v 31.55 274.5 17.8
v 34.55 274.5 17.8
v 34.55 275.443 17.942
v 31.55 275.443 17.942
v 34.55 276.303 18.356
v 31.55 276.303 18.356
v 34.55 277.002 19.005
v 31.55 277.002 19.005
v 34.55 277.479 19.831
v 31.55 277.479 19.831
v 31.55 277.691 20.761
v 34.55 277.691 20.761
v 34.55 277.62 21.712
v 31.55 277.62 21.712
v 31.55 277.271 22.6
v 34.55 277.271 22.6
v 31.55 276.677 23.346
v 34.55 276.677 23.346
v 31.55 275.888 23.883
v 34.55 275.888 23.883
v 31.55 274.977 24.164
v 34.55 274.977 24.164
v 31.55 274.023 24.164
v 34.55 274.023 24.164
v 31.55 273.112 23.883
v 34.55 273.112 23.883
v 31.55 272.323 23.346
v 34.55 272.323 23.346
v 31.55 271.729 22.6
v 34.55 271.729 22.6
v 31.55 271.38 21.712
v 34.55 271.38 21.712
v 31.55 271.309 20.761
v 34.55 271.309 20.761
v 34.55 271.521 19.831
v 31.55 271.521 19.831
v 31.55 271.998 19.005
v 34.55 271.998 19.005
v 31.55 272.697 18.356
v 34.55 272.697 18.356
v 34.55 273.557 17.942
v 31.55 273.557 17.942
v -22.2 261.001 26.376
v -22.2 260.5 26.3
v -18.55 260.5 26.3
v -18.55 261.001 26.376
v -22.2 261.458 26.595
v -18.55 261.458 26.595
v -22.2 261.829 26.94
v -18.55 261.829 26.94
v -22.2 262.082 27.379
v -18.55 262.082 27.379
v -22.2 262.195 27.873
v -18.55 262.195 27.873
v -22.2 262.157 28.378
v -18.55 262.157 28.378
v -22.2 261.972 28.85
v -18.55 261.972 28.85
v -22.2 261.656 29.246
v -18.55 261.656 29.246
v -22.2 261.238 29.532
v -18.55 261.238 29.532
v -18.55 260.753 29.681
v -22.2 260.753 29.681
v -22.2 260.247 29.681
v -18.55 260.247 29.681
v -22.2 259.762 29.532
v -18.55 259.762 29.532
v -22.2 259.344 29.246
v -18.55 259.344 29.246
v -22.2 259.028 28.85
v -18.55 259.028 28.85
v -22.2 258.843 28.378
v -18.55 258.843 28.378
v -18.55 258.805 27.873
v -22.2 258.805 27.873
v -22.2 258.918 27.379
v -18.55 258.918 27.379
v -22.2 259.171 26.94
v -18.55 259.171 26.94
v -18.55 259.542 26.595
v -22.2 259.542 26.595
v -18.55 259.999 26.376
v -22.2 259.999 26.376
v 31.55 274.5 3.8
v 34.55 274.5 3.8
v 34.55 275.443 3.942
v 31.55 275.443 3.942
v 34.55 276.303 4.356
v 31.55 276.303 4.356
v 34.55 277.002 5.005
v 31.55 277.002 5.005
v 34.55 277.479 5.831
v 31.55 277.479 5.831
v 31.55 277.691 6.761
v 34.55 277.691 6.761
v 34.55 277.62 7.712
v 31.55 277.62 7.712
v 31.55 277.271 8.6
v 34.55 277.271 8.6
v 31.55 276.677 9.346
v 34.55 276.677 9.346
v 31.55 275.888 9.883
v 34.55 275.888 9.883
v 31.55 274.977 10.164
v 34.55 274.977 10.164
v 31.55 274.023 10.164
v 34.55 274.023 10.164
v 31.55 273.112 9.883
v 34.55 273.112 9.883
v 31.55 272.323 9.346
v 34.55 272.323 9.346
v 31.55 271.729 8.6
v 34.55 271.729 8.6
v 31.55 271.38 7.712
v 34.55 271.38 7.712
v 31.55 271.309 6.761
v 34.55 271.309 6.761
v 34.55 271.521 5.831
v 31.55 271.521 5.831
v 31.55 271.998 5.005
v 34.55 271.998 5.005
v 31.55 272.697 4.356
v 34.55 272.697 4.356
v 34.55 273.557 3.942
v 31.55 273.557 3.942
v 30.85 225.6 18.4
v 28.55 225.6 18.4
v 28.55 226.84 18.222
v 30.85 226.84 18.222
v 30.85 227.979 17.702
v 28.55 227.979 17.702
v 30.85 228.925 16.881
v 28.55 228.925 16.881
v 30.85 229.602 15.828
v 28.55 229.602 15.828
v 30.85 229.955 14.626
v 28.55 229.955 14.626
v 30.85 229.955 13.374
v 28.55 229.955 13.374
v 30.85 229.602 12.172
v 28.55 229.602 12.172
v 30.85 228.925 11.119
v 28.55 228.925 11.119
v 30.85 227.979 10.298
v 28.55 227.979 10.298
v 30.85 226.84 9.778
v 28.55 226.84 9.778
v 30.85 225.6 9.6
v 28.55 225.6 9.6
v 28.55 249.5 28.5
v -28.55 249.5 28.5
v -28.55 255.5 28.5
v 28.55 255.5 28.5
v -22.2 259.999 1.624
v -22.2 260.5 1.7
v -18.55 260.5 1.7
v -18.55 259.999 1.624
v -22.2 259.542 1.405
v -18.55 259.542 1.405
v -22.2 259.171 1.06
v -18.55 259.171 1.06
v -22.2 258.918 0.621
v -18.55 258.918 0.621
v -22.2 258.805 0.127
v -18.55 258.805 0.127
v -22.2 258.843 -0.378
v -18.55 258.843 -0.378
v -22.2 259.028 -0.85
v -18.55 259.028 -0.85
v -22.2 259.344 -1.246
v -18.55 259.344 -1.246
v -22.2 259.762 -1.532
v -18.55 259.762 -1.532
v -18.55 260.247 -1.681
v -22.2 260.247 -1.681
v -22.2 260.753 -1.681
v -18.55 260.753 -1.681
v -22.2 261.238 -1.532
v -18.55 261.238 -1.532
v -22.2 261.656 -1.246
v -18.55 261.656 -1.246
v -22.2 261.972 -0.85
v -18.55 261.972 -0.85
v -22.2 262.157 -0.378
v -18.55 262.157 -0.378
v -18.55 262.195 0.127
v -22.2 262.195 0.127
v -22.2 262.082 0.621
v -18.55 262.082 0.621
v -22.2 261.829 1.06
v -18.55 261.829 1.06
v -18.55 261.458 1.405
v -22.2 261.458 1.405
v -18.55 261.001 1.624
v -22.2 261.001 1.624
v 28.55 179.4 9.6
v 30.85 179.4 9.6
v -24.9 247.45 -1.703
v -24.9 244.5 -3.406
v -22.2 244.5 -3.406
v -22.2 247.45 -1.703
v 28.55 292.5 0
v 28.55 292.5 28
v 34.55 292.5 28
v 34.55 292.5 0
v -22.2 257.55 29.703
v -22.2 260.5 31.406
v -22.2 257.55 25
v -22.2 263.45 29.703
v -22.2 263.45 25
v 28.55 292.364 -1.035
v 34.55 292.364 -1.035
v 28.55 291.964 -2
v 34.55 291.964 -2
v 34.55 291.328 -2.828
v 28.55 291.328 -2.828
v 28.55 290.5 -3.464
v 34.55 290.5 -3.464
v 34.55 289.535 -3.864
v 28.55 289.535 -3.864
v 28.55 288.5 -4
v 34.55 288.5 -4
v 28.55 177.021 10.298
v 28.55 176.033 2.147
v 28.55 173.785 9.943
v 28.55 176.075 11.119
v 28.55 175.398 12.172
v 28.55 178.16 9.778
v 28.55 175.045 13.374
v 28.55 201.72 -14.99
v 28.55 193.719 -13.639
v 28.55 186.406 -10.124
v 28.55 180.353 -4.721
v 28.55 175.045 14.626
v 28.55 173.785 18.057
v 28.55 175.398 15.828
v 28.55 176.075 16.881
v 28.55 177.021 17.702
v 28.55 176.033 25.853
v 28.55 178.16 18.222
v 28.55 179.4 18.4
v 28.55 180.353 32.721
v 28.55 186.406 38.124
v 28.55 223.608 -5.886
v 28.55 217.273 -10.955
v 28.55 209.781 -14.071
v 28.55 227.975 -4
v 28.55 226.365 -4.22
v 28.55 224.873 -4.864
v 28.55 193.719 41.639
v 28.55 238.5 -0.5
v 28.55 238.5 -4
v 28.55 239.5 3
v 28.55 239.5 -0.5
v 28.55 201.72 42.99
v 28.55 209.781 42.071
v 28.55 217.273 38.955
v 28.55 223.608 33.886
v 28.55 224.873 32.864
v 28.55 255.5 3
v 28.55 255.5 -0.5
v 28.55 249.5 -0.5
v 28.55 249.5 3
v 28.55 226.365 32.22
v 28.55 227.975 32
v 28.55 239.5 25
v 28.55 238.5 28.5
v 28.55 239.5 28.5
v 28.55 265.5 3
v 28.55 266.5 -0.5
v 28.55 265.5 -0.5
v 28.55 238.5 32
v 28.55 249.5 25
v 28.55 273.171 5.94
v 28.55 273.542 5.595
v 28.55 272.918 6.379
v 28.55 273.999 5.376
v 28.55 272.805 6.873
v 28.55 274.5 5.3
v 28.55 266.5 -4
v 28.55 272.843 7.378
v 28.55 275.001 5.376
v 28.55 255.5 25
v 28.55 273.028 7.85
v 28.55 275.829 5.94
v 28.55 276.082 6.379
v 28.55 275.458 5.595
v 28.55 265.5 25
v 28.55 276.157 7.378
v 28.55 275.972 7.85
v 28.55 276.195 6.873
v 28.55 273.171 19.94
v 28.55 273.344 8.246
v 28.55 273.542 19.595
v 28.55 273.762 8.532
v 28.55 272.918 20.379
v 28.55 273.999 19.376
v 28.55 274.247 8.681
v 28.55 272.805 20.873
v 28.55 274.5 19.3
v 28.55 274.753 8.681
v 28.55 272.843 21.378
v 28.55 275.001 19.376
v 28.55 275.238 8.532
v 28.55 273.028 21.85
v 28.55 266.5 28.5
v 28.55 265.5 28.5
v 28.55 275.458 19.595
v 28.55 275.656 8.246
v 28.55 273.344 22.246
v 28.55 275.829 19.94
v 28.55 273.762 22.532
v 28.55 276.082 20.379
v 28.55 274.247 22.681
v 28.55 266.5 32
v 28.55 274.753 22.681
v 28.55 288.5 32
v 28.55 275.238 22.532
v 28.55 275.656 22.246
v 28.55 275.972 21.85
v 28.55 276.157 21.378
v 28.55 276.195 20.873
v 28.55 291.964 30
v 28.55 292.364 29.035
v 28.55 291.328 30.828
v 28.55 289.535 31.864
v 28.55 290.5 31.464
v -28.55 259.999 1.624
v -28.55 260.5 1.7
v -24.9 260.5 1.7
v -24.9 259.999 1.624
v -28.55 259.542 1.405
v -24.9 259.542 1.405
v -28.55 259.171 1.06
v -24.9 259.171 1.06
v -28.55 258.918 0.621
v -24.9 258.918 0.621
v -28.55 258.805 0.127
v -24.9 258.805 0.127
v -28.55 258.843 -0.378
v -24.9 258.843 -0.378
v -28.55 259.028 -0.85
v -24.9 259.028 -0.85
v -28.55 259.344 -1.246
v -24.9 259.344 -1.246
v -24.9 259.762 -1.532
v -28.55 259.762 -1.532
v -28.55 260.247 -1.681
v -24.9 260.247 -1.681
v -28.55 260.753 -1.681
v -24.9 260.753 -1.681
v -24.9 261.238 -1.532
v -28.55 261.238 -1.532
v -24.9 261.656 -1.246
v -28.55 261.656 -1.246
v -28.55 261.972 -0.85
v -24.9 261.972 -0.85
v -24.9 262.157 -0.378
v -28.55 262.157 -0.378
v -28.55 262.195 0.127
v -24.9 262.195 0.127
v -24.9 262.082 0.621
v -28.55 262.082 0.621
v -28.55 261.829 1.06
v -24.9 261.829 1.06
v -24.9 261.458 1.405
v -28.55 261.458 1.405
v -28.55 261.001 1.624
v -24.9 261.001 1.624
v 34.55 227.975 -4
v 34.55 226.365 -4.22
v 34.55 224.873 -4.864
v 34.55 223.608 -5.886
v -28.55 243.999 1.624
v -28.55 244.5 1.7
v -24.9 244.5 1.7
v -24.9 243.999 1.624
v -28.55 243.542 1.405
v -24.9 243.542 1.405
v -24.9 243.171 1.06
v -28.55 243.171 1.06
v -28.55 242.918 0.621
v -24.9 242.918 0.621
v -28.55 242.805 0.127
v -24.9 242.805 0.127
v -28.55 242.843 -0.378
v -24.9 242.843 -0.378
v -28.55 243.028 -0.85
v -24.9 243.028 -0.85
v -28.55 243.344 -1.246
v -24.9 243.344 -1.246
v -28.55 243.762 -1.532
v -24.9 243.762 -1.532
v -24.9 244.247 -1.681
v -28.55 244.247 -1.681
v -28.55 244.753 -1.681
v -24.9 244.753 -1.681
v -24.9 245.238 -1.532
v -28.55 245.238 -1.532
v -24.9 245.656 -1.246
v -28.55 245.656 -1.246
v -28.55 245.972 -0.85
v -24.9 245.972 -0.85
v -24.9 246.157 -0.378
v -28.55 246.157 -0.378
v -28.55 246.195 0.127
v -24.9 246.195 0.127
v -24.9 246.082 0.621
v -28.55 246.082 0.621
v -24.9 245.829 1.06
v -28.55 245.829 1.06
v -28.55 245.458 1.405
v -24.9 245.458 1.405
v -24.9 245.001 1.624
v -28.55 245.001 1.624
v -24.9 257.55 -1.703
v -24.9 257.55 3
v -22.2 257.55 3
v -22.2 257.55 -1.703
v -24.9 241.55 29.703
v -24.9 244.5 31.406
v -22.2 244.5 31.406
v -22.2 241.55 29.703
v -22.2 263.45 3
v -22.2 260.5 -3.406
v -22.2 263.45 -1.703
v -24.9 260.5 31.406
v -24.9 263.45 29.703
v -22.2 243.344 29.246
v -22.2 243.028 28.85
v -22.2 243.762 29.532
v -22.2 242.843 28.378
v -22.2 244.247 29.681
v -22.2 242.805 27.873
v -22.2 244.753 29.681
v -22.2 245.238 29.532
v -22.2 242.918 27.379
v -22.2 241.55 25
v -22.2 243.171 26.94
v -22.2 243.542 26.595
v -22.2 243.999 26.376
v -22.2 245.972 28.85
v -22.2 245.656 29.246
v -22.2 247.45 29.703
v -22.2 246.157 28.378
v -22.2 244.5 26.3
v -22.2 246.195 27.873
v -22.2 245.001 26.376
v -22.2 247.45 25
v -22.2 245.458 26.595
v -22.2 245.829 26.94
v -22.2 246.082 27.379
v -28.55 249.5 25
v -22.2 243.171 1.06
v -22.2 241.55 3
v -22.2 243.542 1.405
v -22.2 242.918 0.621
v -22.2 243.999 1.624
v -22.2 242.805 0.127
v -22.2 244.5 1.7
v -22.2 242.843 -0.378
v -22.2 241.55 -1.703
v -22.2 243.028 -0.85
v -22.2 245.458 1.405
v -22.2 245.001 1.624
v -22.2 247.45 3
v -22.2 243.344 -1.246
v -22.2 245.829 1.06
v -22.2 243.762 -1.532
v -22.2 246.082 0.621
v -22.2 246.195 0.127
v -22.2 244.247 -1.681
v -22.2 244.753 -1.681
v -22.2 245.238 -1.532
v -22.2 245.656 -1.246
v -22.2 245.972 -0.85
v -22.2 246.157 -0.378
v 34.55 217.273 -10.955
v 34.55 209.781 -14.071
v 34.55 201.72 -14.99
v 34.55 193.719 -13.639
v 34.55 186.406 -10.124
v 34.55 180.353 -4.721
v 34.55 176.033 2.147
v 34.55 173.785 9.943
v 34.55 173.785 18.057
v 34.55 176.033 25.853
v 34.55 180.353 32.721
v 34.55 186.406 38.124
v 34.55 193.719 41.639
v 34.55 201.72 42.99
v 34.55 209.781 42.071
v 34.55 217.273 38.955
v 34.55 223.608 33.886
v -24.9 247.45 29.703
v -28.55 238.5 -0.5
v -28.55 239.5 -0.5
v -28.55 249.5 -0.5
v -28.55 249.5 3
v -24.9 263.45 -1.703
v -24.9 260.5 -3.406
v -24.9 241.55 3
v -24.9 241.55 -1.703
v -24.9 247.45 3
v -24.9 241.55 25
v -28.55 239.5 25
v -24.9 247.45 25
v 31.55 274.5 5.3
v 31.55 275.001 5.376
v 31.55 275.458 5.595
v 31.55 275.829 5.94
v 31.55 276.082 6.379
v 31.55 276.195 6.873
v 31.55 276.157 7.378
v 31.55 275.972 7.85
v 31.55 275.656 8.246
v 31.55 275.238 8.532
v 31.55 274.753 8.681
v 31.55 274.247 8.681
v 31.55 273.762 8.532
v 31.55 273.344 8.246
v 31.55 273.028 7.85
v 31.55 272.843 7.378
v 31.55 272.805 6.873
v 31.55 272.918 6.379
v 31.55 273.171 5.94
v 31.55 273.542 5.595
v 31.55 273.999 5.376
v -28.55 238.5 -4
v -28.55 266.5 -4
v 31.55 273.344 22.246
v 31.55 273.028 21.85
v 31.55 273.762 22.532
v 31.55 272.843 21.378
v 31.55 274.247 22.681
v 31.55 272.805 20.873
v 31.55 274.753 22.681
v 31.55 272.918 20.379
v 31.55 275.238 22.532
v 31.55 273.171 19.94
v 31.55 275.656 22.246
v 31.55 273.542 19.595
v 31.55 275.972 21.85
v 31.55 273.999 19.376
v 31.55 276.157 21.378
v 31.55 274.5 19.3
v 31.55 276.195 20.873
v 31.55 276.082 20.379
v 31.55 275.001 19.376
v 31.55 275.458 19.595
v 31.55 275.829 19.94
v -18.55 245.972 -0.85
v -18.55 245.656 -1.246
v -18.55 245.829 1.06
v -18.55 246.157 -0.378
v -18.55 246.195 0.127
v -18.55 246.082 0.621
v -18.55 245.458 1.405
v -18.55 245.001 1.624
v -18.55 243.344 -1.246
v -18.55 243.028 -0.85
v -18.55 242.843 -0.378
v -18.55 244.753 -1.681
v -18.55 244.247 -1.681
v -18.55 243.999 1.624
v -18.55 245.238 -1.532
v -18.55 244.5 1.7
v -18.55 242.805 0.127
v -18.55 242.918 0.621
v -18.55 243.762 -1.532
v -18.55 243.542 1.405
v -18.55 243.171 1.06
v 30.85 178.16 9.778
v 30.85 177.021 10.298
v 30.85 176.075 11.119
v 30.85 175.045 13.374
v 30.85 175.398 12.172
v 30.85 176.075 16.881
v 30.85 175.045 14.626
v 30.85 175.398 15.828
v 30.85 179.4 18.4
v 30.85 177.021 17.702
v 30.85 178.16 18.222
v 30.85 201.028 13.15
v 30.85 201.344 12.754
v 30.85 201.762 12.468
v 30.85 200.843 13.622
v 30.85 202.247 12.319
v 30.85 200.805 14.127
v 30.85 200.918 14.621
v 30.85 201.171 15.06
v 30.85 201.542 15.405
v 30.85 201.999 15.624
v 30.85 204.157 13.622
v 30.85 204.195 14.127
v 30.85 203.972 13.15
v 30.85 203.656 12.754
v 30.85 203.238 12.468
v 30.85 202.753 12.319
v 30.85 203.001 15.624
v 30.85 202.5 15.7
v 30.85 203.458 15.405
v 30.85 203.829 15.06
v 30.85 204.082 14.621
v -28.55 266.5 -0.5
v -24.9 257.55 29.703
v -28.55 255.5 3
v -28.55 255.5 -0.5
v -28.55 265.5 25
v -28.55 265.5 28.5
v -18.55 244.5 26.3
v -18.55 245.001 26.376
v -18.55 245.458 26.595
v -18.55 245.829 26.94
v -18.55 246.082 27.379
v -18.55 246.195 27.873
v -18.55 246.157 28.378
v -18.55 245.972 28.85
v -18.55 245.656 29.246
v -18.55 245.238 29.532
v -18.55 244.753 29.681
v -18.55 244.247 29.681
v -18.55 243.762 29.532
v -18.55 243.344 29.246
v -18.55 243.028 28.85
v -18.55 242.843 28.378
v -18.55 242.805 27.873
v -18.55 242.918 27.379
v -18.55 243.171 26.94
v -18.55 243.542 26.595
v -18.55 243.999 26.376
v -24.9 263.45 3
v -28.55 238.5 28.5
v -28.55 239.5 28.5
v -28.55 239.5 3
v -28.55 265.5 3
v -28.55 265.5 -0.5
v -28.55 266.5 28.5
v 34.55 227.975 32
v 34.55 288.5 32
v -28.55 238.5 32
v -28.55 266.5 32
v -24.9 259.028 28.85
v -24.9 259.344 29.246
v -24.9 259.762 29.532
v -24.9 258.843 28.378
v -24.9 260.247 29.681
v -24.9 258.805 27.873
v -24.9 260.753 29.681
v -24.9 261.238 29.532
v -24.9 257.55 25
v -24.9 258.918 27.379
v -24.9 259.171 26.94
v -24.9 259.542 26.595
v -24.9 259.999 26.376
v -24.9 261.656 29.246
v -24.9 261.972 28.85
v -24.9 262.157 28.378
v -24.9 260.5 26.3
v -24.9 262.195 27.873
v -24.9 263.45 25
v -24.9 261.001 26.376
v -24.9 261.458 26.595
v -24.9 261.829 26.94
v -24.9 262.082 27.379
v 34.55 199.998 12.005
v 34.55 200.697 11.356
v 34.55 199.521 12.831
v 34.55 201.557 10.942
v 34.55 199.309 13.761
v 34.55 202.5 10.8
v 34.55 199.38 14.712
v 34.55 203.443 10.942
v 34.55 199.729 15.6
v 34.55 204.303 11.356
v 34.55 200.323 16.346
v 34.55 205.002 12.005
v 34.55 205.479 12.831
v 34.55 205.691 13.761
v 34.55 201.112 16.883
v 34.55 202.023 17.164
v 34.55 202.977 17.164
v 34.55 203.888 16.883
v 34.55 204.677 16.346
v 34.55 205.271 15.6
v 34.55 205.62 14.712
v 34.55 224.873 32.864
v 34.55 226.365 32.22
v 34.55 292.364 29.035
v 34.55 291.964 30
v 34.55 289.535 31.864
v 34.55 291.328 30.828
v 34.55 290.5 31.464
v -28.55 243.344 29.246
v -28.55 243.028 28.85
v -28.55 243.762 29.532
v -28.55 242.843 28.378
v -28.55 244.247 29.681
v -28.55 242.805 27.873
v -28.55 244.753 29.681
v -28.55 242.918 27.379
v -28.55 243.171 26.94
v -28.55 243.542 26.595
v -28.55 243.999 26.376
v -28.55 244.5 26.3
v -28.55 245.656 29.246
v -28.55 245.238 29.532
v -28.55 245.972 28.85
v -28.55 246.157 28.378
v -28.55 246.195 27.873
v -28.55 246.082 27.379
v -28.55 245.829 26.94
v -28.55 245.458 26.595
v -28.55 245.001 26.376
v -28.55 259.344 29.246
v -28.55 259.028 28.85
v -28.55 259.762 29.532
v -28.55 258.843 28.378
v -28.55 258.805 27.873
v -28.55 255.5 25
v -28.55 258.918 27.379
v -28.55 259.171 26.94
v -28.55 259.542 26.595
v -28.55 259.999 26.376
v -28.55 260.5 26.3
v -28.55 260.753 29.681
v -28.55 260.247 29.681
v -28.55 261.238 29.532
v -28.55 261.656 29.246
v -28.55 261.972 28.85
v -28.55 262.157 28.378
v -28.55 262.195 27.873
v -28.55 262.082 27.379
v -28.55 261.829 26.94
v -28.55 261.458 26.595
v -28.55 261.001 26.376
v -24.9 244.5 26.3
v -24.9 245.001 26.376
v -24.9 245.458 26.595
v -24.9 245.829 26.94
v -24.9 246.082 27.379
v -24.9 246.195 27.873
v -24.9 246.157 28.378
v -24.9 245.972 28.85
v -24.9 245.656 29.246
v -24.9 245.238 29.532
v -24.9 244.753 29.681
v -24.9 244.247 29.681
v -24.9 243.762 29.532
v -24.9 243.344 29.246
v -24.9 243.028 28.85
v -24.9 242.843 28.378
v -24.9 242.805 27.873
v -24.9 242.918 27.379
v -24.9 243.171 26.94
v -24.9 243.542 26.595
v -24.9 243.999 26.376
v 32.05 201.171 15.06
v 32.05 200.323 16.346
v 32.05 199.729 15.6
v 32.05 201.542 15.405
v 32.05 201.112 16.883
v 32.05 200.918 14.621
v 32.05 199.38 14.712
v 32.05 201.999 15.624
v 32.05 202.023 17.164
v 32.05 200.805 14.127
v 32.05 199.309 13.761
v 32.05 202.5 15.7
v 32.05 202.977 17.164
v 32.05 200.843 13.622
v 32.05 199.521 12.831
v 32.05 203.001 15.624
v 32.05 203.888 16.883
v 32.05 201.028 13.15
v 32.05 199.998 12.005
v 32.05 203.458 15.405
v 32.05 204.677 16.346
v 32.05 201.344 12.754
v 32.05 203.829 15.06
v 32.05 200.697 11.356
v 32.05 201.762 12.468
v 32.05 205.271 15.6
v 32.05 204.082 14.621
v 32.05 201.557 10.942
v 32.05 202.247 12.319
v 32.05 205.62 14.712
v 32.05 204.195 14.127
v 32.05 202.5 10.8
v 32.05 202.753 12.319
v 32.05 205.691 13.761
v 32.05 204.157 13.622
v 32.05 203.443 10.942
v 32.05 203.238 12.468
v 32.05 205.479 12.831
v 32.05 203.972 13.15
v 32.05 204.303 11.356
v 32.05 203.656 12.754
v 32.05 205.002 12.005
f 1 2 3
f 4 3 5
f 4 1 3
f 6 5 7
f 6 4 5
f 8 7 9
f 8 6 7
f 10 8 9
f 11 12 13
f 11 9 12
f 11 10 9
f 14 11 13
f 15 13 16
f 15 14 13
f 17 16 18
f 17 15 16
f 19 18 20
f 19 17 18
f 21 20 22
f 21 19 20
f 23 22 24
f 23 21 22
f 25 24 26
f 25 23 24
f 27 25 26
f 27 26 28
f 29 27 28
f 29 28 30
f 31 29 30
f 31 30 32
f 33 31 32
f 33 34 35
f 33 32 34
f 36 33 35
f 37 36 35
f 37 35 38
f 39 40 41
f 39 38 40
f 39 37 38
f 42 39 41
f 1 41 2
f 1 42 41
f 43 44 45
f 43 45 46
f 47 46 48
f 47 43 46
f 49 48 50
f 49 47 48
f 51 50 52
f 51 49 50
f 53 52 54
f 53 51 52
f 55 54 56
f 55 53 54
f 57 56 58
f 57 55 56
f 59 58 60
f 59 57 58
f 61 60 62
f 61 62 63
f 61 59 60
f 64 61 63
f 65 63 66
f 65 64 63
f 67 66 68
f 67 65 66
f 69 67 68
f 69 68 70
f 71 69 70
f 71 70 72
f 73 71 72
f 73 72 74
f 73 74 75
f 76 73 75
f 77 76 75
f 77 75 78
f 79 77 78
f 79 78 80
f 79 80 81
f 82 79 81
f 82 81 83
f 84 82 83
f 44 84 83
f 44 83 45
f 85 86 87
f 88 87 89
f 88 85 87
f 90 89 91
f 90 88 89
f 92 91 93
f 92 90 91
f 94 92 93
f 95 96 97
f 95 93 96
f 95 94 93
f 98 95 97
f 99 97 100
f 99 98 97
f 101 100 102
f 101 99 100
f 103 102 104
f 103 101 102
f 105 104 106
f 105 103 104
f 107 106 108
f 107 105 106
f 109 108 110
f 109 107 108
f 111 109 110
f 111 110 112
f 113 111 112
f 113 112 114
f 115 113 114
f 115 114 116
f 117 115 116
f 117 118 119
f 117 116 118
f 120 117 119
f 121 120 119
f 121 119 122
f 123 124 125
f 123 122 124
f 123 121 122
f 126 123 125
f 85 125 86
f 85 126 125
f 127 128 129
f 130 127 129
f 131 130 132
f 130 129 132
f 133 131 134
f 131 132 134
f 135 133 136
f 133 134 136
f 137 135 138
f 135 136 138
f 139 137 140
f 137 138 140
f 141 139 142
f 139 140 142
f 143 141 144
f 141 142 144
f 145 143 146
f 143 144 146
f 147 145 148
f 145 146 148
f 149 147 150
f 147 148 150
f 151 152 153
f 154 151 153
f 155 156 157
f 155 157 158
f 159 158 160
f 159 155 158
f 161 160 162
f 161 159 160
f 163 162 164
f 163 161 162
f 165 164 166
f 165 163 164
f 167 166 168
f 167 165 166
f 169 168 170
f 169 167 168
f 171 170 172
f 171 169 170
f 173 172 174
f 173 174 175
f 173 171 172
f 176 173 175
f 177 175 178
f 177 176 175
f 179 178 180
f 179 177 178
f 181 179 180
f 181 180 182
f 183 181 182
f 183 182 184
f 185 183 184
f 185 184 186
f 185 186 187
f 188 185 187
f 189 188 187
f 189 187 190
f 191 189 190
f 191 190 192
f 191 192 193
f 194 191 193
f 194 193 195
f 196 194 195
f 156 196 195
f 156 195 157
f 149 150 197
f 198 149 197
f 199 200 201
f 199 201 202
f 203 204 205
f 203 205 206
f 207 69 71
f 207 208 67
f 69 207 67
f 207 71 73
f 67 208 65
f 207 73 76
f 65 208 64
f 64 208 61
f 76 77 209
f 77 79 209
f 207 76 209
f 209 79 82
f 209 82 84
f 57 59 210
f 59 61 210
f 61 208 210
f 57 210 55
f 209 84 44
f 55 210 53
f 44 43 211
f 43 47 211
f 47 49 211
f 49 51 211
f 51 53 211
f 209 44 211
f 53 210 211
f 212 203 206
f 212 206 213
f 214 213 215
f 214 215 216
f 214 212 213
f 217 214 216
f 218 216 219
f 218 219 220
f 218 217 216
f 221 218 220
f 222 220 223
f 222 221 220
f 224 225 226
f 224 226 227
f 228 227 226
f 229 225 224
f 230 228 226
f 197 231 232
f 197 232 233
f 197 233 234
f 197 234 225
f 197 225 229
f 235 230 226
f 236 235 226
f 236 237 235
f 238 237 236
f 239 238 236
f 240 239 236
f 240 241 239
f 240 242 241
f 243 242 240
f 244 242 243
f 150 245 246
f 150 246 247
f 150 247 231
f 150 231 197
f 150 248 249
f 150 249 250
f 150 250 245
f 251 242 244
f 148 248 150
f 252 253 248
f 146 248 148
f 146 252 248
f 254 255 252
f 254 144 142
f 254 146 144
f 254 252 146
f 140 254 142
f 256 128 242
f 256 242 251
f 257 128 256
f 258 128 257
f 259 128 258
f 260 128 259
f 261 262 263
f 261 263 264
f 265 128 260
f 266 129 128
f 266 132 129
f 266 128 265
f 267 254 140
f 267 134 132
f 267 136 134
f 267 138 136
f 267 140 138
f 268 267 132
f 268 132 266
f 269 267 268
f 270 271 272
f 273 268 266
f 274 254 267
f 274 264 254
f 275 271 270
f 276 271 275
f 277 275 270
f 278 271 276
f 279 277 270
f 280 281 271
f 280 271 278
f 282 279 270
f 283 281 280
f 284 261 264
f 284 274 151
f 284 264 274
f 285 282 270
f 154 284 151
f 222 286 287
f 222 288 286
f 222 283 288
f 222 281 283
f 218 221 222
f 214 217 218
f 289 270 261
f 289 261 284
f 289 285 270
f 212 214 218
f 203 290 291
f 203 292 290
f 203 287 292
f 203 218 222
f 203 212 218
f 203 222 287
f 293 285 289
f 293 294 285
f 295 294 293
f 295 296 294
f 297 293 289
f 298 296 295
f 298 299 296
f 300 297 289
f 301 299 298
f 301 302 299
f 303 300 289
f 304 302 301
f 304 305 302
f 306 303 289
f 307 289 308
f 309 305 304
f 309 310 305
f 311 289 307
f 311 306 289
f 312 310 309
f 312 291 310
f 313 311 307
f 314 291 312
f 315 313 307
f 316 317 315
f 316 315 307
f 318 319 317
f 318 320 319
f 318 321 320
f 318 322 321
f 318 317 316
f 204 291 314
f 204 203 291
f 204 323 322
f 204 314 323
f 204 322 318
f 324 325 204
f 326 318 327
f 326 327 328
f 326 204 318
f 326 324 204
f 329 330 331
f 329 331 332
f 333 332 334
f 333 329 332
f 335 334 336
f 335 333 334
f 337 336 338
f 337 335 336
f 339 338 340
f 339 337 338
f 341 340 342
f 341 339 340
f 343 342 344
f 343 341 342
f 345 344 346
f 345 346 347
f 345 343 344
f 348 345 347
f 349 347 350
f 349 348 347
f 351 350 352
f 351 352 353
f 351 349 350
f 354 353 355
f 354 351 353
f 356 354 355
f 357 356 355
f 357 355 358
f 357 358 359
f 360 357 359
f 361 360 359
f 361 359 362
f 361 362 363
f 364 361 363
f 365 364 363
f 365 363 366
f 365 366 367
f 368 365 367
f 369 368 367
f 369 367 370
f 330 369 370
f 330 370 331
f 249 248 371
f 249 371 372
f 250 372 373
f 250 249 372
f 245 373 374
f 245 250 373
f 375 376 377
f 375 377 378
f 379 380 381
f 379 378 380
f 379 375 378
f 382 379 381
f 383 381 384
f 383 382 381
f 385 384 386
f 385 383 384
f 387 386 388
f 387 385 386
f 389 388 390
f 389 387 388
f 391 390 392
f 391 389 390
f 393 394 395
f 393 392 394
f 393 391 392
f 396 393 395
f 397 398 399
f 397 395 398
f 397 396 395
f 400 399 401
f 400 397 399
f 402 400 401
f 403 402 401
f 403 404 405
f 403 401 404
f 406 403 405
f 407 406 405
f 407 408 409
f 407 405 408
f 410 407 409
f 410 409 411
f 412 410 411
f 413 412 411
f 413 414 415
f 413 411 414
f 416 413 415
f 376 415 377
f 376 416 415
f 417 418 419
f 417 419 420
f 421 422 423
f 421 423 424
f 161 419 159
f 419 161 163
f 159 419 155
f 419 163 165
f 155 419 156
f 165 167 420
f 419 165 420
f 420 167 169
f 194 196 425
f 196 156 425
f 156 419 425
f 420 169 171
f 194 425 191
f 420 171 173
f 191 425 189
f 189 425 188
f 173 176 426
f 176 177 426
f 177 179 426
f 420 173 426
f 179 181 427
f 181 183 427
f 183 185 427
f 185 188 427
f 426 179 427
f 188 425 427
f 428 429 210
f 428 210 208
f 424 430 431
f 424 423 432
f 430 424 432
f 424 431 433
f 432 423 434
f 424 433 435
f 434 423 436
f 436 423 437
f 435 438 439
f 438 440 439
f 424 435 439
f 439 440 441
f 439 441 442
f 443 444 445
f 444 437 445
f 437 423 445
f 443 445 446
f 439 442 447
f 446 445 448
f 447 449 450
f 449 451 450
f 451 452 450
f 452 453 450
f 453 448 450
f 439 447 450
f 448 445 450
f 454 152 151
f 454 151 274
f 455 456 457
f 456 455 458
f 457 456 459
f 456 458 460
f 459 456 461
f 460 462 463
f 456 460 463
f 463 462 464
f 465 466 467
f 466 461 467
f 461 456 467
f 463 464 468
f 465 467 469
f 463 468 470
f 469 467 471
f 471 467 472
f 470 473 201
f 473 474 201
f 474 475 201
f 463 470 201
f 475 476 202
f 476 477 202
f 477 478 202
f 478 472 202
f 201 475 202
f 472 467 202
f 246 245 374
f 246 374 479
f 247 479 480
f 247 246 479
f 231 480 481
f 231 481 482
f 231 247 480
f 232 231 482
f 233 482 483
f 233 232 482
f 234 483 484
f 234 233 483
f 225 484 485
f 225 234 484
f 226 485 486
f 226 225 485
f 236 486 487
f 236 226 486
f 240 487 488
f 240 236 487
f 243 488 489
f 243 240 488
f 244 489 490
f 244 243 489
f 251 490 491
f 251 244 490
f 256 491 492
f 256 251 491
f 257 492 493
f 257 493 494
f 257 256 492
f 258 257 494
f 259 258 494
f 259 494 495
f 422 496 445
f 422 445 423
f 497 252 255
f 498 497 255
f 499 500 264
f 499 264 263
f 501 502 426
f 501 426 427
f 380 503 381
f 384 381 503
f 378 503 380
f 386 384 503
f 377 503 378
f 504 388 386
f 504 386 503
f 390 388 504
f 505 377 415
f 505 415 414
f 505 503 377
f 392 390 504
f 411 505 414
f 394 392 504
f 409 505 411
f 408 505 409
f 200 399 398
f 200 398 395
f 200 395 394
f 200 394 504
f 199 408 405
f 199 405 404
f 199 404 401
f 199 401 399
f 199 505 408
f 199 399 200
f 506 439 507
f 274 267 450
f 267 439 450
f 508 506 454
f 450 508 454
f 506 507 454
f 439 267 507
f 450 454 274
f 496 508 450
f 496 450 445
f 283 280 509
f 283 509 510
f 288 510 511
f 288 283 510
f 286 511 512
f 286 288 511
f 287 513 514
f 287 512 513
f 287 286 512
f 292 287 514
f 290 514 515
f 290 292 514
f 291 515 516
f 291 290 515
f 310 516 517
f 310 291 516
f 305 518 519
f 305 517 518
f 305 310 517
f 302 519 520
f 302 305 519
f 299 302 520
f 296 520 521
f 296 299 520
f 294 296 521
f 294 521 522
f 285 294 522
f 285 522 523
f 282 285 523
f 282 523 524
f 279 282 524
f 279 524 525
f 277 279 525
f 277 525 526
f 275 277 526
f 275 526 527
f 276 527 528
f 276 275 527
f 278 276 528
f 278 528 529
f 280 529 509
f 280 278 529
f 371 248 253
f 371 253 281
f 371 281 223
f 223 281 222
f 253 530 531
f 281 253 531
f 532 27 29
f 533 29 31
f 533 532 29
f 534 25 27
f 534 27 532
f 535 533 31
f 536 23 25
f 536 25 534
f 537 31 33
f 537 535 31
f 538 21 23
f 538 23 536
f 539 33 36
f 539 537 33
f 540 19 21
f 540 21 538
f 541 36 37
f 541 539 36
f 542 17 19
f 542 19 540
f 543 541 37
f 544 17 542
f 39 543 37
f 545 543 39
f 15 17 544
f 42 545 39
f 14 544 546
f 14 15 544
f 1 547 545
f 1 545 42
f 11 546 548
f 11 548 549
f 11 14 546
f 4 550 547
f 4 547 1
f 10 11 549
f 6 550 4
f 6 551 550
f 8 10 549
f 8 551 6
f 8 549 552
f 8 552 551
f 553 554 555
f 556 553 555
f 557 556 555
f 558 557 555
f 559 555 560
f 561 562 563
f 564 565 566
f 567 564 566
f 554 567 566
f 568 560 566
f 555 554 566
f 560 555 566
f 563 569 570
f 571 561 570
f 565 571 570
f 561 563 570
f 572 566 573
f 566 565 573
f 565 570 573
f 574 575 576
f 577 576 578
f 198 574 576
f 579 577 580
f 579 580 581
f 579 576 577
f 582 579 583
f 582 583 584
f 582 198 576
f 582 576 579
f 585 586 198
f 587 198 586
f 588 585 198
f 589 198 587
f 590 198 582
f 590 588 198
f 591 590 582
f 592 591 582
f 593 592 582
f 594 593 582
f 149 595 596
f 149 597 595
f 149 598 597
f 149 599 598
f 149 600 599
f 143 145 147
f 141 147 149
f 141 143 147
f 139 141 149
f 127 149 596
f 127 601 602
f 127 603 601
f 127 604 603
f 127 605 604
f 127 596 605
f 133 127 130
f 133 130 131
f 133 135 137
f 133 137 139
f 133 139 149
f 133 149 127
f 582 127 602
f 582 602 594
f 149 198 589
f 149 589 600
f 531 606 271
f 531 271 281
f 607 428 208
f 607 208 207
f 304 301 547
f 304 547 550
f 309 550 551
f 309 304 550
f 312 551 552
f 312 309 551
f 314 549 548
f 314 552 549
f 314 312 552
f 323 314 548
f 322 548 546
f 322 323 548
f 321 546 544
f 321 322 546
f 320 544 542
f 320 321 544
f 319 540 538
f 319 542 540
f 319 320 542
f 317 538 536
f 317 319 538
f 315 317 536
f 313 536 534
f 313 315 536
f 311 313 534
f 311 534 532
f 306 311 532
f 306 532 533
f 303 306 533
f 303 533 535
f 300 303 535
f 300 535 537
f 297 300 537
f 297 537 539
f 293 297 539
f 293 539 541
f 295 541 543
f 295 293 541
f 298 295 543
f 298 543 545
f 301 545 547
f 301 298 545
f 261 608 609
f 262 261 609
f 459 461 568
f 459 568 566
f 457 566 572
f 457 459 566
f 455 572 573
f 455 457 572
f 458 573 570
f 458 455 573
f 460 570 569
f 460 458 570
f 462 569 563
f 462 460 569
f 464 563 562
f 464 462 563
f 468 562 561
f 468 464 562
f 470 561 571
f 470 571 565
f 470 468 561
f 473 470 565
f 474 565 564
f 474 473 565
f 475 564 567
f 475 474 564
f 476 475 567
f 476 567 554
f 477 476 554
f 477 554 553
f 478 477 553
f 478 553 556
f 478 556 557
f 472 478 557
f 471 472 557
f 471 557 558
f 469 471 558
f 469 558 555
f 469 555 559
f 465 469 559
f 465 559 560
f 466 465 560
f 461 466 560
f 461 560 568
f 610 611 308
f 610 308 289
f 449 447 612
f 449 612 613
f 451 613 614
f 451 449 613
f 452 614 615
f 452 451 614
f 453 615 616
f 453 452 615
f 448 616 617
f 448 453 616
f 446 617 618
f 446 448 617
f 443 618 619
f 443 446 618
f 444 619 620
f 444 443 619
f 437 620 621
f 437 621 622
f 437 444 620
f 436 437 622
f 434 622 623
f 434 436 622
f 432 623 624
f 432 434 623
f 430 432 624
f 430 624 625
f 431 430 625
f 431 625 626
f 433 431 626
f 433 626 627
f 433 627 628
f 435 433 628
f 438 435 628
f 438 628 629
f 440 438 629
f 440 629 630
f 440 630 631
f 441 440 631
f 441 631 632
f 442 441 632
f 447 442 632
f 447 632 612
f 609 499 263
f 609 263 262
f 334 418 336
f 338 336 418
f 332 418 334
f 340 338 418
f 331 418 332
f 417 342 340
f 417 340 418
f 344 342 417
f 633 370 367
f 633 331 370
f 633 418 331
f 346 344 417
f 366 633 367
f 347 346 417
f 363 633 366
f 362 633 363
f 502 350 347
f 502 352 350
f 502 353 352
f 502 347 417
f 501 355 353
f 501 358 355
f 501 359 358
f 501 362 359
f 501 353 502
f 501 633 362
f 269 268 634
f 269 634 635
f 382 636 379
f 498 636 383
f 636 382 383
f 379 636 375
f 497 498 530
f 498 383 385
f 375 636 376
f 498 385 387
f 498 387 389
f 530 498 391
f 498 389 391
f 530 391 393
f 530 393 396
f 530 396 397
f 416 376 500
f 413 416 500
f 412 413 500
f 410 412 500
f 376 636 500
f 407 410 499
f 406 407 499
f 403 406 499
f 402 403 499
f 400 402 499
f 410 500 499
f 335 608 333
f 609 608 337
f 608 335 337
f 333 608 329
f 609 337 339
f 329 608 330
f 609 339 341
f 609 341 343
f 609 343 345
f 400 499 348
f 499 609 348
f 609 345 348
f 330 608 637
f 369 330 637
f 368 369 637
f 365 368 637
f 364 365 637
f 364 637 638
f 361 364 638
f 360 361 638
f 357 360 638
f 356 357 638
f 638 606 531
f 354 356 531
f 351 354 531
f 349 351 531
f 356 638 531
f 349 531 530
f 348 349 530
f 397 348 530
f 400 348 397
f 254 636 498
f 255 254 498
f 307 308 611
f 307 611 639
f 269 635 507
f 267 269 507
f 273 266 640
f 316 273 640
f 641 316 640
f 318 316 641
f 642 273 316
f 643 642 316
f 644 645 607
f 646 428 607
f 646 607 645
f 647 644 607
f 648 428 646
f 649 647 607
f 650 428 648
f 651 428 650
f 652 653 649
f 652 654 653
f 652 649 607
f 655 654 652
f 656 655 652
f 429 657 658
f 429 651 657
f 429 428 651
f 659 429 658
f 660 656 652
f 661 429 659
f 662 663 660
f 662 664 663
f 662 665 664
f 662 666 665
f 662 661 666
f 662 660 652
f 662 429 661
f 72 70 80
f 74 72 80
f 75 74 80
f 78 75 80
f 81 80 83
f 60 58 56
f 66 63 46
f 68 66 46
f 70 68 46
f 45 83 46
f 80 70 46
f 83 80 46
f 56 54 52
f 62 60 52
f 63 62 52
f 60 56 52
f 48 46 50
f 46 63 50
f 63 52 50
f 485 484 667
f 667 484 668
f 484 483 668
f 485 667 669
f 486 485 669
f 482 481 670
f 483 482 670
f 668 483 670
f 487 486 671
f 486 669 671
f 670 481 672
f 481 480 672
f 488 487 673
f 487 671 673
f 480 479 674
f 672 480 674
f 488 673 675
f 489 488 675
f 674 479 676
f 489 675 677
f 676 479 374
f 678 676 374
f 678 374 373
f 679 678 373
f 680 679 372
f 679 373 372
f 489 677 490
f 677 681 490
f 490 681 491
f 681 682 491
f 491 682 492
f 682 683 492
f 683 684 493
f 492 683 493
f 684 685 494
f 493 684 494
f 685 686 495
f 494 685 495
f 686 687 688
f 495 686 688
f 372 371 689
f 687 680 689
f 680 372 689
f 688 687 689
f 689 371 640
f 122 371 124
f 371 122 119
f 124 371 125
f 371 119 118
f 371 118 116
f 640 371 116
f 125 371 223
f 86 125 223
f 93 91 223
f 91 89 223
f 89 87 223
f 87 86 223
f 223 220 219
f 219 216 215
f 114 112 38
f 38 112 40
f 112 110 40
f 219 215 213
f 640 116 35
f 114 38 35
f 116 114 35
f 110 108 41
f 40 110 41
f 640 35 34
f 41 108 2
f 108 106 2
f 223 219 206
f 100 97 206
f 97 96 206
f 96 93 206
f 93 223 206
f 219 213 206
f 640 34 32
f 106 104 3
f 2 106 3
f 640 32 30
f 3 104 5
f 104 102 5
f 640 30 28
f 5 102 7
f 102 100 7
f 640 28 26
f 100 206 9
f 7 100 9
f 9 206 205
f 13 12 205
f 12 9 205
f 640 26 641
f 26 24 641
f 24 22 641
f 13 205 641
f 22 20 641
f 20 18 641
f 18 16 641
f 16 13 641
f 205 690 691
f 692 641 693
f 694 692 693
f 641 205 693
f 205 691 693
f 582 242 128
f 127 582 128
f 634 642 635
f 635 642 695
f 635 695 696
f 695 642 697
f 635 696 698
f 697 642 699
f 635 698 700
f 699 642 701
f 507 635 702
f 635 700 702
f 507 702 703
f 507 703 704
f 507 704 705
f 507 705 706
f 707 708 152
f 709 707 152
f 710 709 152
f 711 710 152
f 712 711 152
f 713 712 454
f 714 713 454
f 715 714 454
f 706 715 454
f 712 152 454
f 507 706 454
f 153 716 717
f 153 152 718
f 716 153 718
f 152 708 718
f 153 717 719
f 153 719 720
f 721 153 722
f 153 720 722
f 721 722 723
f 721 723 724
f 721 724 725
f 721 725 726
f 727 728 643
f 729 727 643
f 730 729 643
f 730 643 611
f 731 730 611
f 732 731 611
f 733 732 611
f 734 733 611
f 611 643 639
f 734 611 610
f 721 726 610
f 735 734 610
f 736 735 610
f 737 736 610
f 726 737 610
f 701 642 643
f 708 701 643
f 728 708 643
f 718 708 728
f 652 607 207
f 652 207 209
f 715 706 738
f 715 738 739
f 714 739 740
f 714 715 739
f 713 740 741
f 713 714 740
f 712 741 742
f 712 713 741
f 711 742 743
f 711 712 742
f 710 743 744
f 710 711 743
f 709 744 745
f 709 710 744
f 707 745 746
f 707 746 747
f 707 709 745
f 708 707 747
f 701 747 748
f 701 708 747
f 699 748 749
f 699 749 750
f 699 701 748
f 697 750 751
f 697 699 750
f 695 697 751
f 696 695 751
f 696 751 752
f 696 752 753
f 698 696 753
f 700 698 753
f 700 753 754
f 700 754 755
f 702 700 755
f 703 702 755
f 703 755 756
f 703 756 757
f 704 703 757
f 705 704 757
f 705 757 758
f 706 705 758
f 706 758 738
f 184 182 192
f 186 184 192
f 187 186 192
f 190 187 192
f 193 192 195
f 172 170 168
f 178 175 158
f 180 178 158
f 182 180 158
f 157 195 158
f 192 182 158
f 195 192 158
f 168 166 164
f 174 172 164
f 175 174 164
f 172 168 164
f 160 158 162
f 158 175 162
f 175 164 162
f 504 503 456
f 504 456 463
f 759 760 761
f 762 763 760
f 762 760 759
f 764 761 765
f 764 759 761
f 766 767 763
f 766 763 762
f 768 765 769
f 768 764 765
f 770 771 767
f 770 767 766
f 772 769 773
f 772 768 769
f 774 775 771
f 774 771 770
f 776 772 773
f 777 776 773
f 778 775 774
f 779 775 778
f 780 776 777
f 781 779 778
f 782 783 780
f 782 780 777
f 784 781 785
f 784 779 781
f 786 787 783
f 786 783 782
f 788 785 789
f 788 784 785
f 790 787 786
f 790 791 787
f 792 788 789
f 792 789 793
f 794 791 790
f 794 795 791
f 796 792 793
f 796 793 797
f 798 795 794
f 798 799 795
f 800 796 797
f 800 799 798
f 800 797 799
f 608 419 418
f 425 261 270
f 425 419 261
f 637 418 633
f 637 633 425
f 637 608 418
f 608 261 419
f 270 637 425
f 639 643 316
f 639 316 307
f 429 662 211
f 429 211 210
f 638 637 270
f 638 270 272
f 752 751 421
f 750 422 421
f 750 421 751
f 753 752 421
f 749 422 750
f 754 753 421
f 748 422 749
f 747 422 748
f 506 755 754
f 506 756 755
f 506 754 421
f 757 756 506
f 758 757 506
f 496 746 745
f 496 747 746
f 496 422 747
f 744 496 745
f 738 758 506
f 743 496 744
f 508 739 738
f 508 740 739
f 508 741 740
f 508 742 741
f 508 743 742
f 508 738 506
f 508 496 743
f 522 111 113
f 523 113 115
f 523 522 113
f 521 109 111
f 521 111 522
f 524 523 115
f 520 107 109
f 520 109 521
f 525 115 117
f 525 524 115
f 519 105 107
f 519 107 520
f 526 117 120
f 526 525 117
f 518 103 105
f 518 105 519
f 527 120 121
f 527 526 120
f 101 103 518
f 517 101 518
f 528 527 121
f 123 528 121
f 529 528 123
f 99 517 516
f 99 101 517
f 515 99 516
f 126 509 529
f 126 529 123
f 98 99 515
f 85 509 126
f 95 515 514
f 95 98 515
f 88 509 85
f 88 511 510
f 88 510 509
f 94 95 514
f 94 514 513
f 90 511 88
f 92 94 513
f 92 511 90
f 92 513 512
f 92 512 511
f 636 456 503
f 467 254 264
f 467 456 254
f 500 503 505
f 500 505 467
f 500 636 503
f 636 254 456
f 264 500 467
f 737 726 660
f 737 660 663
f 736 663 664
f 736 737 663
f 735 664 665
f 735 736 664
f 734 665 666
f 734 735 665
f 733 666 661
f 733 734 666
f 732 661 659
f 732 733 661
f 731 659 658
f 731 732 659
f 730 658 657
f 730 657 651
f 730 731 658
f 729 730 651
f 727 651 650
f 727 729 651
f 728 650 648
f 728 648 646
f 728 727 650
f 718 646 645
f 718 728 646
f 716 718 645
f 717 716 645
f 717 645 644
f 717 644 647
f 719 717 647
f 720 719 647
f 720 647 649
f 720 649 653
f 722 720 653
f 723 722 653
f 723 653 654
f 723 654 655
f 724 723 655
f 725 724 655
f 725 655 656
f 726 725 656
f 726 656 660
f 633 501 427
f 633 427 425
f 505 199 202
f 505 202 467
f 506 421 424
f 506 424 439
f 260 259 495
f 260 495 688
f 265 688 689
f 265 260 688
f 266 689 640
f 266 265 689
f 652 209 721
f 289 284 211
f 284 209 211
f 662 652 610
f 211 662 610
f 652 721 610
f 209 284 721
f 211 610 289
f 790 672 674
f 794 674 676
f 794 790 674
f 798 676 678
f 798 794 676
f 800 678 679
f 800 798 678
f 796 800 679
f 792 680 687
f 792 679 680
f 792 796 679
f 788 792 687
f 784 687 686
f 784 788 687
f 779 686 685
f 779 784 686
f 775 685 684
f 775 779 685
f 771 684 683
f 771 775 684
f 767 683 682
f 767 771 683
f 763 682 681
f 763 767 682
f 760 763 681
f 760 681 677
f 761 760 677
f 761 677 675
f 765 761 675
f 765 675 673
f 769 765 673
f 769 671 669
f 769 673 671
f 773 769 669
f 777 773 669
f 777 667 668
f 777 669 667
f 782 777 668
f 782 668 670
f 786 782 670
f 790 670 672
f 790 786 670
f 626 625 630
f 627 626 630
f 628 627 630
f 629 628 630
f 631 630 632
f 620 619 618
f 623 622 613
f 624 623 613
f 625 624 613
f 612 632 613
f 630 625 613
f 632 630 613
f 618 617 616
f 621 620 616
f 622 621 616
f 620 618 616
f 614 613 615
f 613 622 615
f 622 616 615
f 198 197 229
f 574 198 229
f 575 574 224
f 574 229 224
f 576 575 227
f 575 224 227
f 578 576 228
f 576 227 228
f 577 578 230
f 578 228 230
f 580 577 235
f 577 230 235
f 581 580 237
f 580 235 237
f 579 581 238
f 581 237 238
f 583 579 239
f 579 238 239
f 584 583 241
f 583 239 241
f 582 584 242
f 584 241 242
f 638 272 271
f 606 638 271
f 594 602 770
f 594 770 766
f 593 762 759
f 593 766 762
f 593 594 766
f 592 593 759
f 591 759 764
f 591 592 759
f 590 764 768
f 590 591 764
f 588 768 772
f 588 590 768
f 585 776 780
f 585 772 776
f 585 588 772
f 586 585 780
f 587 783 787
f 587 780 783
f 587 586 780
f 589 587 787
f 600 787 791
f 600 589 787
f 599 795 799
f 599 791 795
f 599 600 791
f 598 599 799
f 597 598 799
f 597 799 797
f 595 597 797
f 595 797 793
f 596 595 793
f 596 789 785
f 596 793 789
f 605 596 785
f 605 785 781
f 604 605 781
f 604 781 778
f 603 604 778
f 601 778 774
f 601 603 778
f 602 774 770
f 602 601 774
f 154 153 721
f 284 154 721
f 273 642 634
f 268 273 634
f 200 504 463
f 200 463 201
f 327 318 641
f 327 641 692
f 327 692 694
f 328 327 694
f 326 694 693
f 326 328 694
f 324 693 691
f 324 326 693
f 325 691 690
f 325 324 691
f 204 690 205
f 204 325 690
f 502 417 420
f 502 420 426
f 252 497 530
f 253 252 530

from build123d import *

# Parameters (mm, degrees)
PLATE_START                   = 28.55
PLATE_D_DEPTH                 = 6
BOX_START                     = -28.55
SKETCH2_W                     = 3.5
SKETCH2_H                     = 28
BOX_WALLS_DEPTH               = 57.3
WALL_START                    = -28.55
SKETCH3_W                     = 3.5
SKETCH3_H                     = 10
WALL_BOSSES_DEPTH             = 57.3
HORN_START                    = 28.35
HORN_POCKET_DEPTH             = 2.5
BOLT_START                    = 28.35
SKETCH5_R                     = 1.7
BOLT_HOLES_DEPTH              = 6.4
HUB_START                     = 32.05
SKETCH6_R                     = 3.2
HUB_COUNTERBORE_DEPTH         = 2.7
HEAD_MOUNT_START              = 31.55
SKETCH7_R                     = 3.2
HEAD_MOUNT_COUNTERBORES_DEPTH = 3.2
COVER_START                   = -28.75
SKETCH8_R                     = 1.7
COVER_BOLT_HOLES_DEPTH        = 10.2
COVER_START_2                 = -24.9
COVER_NUT_SLOTS_DEPTH         = 2.7


with BuildPart() as part:
    # Sketch1 → Plate D (new body)
    with BuildSketch(Plane(origin=(0, 0, 0), x_dir=(0, 0, -1), z_dir=(1, 0, 0)).offset(PLATE_START)):
        with BuildLine():
            Line((-32, 227.975478406), (-32, 288.5))
            ThreePointArc((-32, 288.5), (-30.828427125, 291.328427125), (-28, 292.5))
            Line((-28, 292.5), (0, 292.5))
            ThreePointArc((0, 292.5), (2.828427125, 291.328427125), (4, 288.5))
            Line((4, 288.5), (4, 227.975478406))
            ThreePointArc((4, 227.975478406), (4.49156491, 225.597003504), (5.885714286, 223.608253536))
            ThreePointArc((5.885714286, 223.608253536), (-14, 173.5), (-33.885714286, 223.608253536))
            ThreePointArc((-33.885714286, 223.608253536), (-32.49156491, 225.597003504), (-32, 227.975478406))
        make_face()
    extrude(amount=PLATE_D_DEPTH)

    # Sketch2 → Box walls (add)
    with BuildSketch(Plane(origin=(0, 0, 0), x_dir=(0, 0, -1), z_dir=(1, 0, 0)).offset(BOX_START)):
        with Locations((2.25, 252.5)):
            Rectangle(SKETCH2_W, SKETCH2_H)
        with Locations((-30.25, 252.5)):
            Rectangle(SKETCH2_W, SKETCH2_H)
    extrude(amount=BOX_WALLS_DEPTH)

    # Sketch3 → Wall bosses (add)
    with BuildSketch(Plane(origin=(0, 0, 0), x_dir=(0, 0, -1), z_dir=(1, 0, 0)).offset(WALL_START)):
        with Locations((-1.25, 244.5)):
            Rectangle(SKETCH3_W, SKETCH3_H)
        with Locations((-26.75, 244.5)):
            Rectangle(SKETCH3_W, SKETCH3_H)
        with Locations((-1.25, 260.5)):
            Rectangle(SKETCH3_W, SKETCH3_H)
        with Locations((-26.75, 260.5)):
            Rectangle(SKETCH3_W, SKETCH3_H)
    extrude(amount=WALL_BOSSES_DEPTH)

    # Sketch4 → Horn pocket (cut)
    with BuildSketch(Plane(origin=(0, 0, 0), x_dir=(0, 0, -1), z_dir=(1, 0, 0)).offset(HORN_START)):
        with BuildLine():
            Line((-18.4, 179.4), (-18.4, 225.6))
            ThreePointArc((-18.4, 225.6), (-14, 230), (-9.6, 225.6))
            Line((-9.6, 225.6), (-9.6, 179.4))
            ThreePointArc((-9.6, 179.4), (-14, 175), (-18.4, 179.4))
        make_face()
    extrude(amount=HORN_POCKET_DEPTH, mode=Mode.SUBTRACT)

    # Sketch5 → Bolt holes (cut)
    with BuildSketch(Plane(origin=(0, 0, 0), x_dir=(0, 0, -1), z_dir=(1, 0, 0)).offset(BOLT_START)):
        with Locations((-14, 202.5)):
            Circle(SKETCH5_R)
        with Locations((-7, 274.5)):
            Circle(SKETCH5_R)
        with Locations((-21, 274.5)):
            Circle(SKETCH5_R)
    extrude(amount=BOLT_HOLES_DEPTH, mode=Mode.SUBTRACT)

    # Sketch6 → Hub counterbore (cut)
    with BuildSketch(Plane(origin=(0, 0, 0), x_dir=(0, 0, -1), z_dir=(1, 0, 0)).offset(HUB_START)):
        with Locations((-14, 202.5)):
            Circle(SKETCH6_R)
    extrude(amount=HUB_COUNTERBORE_DEPTH, mode=Mode.SUBTRACT)

    # Sketch7 → Head-mount counterbores (cut)
    with BuildSketch(Plane(origin=(0, 0, 0), x_dir=(0, 0, -1), z_dir=(1, 0, 0)).offset(HEAD_MOUNT_START)):
        with Locations((-7, 274.5)):
            Circle(SKETCH7_R)
        with Locations((-21, 274.5)):
            Circle(SKETCH7_R)
    extrude(amount=HEAD_MOUNT_COUNTERBORES_DEPTH, mode=Mode.SUBTRACT)

    # Sketch8 → Cover bolt holes (cut)
    with BuildSketch(Plane(origin=(0, 0, 0), x_dir=(0, 0, -1), z_dir=(1, 0, 0)).offset(COVER_START)):
        with Locations((0, 244.5)):
            Circle(SKETCH8_R)
        with Locations((-28, 244.5)):
            Circle(SKETCH8_R)
        with Locations((0, 260.5)):
            Circle(SKETCH8_R)
        with Locations((-28, 260.5)):
            Circle(SKETCH8_R)
    extrude(amount=COVER_BOLT_HOLES_DEPTH, mode=Mode.SUBTRACT)

    # Sketch9 → Cover nut slots (cut)
    with BuildSketch(Plane(origin=(0, 0, 0), x_dir=(0, 0, -1), z_dir=(1, 0, 0)).offset(COVER_START_2)):
        Polygon((-1.703183294, 241.55), (1.703183294, 241.55), (3.406366588, 244.5), (1.703183294, 247.45), (-1.703183294, 247.45), (-3.4, 247.45), (-3.4, 241.55), align=None)
        Polygon((-26.296816706, 247.45), (-29.703183294, 247.45), (-31.406366588, 244.5), (-29.703183294, 241.55), (-26.296816706, 241.55), (-24.6, 241.55), (-24.6, 247.45), align=None)
        Polygon((-1.703183294, 257.55), (1.703183294, 257.55), (3.406366588, 260.5), (1.703183294, 263.45), (-1.703183294, 263.45), (-3.4, 263.45), (-3.4, 257.55), align=None)
        Polygon((-26.296816706, 263.45), (-29.703183294, 263.45), (-31.406366588, 260.5), (-29.703183294, 257.55), (-26.296816706, 257.55), (-24.6, 257.55), (-24.6, 263.45), align=None)
    extrude(amount=COVER_NUT_SLOTS_DEPTH, mode=Mode.SUBTRACT)


solid = part.part
